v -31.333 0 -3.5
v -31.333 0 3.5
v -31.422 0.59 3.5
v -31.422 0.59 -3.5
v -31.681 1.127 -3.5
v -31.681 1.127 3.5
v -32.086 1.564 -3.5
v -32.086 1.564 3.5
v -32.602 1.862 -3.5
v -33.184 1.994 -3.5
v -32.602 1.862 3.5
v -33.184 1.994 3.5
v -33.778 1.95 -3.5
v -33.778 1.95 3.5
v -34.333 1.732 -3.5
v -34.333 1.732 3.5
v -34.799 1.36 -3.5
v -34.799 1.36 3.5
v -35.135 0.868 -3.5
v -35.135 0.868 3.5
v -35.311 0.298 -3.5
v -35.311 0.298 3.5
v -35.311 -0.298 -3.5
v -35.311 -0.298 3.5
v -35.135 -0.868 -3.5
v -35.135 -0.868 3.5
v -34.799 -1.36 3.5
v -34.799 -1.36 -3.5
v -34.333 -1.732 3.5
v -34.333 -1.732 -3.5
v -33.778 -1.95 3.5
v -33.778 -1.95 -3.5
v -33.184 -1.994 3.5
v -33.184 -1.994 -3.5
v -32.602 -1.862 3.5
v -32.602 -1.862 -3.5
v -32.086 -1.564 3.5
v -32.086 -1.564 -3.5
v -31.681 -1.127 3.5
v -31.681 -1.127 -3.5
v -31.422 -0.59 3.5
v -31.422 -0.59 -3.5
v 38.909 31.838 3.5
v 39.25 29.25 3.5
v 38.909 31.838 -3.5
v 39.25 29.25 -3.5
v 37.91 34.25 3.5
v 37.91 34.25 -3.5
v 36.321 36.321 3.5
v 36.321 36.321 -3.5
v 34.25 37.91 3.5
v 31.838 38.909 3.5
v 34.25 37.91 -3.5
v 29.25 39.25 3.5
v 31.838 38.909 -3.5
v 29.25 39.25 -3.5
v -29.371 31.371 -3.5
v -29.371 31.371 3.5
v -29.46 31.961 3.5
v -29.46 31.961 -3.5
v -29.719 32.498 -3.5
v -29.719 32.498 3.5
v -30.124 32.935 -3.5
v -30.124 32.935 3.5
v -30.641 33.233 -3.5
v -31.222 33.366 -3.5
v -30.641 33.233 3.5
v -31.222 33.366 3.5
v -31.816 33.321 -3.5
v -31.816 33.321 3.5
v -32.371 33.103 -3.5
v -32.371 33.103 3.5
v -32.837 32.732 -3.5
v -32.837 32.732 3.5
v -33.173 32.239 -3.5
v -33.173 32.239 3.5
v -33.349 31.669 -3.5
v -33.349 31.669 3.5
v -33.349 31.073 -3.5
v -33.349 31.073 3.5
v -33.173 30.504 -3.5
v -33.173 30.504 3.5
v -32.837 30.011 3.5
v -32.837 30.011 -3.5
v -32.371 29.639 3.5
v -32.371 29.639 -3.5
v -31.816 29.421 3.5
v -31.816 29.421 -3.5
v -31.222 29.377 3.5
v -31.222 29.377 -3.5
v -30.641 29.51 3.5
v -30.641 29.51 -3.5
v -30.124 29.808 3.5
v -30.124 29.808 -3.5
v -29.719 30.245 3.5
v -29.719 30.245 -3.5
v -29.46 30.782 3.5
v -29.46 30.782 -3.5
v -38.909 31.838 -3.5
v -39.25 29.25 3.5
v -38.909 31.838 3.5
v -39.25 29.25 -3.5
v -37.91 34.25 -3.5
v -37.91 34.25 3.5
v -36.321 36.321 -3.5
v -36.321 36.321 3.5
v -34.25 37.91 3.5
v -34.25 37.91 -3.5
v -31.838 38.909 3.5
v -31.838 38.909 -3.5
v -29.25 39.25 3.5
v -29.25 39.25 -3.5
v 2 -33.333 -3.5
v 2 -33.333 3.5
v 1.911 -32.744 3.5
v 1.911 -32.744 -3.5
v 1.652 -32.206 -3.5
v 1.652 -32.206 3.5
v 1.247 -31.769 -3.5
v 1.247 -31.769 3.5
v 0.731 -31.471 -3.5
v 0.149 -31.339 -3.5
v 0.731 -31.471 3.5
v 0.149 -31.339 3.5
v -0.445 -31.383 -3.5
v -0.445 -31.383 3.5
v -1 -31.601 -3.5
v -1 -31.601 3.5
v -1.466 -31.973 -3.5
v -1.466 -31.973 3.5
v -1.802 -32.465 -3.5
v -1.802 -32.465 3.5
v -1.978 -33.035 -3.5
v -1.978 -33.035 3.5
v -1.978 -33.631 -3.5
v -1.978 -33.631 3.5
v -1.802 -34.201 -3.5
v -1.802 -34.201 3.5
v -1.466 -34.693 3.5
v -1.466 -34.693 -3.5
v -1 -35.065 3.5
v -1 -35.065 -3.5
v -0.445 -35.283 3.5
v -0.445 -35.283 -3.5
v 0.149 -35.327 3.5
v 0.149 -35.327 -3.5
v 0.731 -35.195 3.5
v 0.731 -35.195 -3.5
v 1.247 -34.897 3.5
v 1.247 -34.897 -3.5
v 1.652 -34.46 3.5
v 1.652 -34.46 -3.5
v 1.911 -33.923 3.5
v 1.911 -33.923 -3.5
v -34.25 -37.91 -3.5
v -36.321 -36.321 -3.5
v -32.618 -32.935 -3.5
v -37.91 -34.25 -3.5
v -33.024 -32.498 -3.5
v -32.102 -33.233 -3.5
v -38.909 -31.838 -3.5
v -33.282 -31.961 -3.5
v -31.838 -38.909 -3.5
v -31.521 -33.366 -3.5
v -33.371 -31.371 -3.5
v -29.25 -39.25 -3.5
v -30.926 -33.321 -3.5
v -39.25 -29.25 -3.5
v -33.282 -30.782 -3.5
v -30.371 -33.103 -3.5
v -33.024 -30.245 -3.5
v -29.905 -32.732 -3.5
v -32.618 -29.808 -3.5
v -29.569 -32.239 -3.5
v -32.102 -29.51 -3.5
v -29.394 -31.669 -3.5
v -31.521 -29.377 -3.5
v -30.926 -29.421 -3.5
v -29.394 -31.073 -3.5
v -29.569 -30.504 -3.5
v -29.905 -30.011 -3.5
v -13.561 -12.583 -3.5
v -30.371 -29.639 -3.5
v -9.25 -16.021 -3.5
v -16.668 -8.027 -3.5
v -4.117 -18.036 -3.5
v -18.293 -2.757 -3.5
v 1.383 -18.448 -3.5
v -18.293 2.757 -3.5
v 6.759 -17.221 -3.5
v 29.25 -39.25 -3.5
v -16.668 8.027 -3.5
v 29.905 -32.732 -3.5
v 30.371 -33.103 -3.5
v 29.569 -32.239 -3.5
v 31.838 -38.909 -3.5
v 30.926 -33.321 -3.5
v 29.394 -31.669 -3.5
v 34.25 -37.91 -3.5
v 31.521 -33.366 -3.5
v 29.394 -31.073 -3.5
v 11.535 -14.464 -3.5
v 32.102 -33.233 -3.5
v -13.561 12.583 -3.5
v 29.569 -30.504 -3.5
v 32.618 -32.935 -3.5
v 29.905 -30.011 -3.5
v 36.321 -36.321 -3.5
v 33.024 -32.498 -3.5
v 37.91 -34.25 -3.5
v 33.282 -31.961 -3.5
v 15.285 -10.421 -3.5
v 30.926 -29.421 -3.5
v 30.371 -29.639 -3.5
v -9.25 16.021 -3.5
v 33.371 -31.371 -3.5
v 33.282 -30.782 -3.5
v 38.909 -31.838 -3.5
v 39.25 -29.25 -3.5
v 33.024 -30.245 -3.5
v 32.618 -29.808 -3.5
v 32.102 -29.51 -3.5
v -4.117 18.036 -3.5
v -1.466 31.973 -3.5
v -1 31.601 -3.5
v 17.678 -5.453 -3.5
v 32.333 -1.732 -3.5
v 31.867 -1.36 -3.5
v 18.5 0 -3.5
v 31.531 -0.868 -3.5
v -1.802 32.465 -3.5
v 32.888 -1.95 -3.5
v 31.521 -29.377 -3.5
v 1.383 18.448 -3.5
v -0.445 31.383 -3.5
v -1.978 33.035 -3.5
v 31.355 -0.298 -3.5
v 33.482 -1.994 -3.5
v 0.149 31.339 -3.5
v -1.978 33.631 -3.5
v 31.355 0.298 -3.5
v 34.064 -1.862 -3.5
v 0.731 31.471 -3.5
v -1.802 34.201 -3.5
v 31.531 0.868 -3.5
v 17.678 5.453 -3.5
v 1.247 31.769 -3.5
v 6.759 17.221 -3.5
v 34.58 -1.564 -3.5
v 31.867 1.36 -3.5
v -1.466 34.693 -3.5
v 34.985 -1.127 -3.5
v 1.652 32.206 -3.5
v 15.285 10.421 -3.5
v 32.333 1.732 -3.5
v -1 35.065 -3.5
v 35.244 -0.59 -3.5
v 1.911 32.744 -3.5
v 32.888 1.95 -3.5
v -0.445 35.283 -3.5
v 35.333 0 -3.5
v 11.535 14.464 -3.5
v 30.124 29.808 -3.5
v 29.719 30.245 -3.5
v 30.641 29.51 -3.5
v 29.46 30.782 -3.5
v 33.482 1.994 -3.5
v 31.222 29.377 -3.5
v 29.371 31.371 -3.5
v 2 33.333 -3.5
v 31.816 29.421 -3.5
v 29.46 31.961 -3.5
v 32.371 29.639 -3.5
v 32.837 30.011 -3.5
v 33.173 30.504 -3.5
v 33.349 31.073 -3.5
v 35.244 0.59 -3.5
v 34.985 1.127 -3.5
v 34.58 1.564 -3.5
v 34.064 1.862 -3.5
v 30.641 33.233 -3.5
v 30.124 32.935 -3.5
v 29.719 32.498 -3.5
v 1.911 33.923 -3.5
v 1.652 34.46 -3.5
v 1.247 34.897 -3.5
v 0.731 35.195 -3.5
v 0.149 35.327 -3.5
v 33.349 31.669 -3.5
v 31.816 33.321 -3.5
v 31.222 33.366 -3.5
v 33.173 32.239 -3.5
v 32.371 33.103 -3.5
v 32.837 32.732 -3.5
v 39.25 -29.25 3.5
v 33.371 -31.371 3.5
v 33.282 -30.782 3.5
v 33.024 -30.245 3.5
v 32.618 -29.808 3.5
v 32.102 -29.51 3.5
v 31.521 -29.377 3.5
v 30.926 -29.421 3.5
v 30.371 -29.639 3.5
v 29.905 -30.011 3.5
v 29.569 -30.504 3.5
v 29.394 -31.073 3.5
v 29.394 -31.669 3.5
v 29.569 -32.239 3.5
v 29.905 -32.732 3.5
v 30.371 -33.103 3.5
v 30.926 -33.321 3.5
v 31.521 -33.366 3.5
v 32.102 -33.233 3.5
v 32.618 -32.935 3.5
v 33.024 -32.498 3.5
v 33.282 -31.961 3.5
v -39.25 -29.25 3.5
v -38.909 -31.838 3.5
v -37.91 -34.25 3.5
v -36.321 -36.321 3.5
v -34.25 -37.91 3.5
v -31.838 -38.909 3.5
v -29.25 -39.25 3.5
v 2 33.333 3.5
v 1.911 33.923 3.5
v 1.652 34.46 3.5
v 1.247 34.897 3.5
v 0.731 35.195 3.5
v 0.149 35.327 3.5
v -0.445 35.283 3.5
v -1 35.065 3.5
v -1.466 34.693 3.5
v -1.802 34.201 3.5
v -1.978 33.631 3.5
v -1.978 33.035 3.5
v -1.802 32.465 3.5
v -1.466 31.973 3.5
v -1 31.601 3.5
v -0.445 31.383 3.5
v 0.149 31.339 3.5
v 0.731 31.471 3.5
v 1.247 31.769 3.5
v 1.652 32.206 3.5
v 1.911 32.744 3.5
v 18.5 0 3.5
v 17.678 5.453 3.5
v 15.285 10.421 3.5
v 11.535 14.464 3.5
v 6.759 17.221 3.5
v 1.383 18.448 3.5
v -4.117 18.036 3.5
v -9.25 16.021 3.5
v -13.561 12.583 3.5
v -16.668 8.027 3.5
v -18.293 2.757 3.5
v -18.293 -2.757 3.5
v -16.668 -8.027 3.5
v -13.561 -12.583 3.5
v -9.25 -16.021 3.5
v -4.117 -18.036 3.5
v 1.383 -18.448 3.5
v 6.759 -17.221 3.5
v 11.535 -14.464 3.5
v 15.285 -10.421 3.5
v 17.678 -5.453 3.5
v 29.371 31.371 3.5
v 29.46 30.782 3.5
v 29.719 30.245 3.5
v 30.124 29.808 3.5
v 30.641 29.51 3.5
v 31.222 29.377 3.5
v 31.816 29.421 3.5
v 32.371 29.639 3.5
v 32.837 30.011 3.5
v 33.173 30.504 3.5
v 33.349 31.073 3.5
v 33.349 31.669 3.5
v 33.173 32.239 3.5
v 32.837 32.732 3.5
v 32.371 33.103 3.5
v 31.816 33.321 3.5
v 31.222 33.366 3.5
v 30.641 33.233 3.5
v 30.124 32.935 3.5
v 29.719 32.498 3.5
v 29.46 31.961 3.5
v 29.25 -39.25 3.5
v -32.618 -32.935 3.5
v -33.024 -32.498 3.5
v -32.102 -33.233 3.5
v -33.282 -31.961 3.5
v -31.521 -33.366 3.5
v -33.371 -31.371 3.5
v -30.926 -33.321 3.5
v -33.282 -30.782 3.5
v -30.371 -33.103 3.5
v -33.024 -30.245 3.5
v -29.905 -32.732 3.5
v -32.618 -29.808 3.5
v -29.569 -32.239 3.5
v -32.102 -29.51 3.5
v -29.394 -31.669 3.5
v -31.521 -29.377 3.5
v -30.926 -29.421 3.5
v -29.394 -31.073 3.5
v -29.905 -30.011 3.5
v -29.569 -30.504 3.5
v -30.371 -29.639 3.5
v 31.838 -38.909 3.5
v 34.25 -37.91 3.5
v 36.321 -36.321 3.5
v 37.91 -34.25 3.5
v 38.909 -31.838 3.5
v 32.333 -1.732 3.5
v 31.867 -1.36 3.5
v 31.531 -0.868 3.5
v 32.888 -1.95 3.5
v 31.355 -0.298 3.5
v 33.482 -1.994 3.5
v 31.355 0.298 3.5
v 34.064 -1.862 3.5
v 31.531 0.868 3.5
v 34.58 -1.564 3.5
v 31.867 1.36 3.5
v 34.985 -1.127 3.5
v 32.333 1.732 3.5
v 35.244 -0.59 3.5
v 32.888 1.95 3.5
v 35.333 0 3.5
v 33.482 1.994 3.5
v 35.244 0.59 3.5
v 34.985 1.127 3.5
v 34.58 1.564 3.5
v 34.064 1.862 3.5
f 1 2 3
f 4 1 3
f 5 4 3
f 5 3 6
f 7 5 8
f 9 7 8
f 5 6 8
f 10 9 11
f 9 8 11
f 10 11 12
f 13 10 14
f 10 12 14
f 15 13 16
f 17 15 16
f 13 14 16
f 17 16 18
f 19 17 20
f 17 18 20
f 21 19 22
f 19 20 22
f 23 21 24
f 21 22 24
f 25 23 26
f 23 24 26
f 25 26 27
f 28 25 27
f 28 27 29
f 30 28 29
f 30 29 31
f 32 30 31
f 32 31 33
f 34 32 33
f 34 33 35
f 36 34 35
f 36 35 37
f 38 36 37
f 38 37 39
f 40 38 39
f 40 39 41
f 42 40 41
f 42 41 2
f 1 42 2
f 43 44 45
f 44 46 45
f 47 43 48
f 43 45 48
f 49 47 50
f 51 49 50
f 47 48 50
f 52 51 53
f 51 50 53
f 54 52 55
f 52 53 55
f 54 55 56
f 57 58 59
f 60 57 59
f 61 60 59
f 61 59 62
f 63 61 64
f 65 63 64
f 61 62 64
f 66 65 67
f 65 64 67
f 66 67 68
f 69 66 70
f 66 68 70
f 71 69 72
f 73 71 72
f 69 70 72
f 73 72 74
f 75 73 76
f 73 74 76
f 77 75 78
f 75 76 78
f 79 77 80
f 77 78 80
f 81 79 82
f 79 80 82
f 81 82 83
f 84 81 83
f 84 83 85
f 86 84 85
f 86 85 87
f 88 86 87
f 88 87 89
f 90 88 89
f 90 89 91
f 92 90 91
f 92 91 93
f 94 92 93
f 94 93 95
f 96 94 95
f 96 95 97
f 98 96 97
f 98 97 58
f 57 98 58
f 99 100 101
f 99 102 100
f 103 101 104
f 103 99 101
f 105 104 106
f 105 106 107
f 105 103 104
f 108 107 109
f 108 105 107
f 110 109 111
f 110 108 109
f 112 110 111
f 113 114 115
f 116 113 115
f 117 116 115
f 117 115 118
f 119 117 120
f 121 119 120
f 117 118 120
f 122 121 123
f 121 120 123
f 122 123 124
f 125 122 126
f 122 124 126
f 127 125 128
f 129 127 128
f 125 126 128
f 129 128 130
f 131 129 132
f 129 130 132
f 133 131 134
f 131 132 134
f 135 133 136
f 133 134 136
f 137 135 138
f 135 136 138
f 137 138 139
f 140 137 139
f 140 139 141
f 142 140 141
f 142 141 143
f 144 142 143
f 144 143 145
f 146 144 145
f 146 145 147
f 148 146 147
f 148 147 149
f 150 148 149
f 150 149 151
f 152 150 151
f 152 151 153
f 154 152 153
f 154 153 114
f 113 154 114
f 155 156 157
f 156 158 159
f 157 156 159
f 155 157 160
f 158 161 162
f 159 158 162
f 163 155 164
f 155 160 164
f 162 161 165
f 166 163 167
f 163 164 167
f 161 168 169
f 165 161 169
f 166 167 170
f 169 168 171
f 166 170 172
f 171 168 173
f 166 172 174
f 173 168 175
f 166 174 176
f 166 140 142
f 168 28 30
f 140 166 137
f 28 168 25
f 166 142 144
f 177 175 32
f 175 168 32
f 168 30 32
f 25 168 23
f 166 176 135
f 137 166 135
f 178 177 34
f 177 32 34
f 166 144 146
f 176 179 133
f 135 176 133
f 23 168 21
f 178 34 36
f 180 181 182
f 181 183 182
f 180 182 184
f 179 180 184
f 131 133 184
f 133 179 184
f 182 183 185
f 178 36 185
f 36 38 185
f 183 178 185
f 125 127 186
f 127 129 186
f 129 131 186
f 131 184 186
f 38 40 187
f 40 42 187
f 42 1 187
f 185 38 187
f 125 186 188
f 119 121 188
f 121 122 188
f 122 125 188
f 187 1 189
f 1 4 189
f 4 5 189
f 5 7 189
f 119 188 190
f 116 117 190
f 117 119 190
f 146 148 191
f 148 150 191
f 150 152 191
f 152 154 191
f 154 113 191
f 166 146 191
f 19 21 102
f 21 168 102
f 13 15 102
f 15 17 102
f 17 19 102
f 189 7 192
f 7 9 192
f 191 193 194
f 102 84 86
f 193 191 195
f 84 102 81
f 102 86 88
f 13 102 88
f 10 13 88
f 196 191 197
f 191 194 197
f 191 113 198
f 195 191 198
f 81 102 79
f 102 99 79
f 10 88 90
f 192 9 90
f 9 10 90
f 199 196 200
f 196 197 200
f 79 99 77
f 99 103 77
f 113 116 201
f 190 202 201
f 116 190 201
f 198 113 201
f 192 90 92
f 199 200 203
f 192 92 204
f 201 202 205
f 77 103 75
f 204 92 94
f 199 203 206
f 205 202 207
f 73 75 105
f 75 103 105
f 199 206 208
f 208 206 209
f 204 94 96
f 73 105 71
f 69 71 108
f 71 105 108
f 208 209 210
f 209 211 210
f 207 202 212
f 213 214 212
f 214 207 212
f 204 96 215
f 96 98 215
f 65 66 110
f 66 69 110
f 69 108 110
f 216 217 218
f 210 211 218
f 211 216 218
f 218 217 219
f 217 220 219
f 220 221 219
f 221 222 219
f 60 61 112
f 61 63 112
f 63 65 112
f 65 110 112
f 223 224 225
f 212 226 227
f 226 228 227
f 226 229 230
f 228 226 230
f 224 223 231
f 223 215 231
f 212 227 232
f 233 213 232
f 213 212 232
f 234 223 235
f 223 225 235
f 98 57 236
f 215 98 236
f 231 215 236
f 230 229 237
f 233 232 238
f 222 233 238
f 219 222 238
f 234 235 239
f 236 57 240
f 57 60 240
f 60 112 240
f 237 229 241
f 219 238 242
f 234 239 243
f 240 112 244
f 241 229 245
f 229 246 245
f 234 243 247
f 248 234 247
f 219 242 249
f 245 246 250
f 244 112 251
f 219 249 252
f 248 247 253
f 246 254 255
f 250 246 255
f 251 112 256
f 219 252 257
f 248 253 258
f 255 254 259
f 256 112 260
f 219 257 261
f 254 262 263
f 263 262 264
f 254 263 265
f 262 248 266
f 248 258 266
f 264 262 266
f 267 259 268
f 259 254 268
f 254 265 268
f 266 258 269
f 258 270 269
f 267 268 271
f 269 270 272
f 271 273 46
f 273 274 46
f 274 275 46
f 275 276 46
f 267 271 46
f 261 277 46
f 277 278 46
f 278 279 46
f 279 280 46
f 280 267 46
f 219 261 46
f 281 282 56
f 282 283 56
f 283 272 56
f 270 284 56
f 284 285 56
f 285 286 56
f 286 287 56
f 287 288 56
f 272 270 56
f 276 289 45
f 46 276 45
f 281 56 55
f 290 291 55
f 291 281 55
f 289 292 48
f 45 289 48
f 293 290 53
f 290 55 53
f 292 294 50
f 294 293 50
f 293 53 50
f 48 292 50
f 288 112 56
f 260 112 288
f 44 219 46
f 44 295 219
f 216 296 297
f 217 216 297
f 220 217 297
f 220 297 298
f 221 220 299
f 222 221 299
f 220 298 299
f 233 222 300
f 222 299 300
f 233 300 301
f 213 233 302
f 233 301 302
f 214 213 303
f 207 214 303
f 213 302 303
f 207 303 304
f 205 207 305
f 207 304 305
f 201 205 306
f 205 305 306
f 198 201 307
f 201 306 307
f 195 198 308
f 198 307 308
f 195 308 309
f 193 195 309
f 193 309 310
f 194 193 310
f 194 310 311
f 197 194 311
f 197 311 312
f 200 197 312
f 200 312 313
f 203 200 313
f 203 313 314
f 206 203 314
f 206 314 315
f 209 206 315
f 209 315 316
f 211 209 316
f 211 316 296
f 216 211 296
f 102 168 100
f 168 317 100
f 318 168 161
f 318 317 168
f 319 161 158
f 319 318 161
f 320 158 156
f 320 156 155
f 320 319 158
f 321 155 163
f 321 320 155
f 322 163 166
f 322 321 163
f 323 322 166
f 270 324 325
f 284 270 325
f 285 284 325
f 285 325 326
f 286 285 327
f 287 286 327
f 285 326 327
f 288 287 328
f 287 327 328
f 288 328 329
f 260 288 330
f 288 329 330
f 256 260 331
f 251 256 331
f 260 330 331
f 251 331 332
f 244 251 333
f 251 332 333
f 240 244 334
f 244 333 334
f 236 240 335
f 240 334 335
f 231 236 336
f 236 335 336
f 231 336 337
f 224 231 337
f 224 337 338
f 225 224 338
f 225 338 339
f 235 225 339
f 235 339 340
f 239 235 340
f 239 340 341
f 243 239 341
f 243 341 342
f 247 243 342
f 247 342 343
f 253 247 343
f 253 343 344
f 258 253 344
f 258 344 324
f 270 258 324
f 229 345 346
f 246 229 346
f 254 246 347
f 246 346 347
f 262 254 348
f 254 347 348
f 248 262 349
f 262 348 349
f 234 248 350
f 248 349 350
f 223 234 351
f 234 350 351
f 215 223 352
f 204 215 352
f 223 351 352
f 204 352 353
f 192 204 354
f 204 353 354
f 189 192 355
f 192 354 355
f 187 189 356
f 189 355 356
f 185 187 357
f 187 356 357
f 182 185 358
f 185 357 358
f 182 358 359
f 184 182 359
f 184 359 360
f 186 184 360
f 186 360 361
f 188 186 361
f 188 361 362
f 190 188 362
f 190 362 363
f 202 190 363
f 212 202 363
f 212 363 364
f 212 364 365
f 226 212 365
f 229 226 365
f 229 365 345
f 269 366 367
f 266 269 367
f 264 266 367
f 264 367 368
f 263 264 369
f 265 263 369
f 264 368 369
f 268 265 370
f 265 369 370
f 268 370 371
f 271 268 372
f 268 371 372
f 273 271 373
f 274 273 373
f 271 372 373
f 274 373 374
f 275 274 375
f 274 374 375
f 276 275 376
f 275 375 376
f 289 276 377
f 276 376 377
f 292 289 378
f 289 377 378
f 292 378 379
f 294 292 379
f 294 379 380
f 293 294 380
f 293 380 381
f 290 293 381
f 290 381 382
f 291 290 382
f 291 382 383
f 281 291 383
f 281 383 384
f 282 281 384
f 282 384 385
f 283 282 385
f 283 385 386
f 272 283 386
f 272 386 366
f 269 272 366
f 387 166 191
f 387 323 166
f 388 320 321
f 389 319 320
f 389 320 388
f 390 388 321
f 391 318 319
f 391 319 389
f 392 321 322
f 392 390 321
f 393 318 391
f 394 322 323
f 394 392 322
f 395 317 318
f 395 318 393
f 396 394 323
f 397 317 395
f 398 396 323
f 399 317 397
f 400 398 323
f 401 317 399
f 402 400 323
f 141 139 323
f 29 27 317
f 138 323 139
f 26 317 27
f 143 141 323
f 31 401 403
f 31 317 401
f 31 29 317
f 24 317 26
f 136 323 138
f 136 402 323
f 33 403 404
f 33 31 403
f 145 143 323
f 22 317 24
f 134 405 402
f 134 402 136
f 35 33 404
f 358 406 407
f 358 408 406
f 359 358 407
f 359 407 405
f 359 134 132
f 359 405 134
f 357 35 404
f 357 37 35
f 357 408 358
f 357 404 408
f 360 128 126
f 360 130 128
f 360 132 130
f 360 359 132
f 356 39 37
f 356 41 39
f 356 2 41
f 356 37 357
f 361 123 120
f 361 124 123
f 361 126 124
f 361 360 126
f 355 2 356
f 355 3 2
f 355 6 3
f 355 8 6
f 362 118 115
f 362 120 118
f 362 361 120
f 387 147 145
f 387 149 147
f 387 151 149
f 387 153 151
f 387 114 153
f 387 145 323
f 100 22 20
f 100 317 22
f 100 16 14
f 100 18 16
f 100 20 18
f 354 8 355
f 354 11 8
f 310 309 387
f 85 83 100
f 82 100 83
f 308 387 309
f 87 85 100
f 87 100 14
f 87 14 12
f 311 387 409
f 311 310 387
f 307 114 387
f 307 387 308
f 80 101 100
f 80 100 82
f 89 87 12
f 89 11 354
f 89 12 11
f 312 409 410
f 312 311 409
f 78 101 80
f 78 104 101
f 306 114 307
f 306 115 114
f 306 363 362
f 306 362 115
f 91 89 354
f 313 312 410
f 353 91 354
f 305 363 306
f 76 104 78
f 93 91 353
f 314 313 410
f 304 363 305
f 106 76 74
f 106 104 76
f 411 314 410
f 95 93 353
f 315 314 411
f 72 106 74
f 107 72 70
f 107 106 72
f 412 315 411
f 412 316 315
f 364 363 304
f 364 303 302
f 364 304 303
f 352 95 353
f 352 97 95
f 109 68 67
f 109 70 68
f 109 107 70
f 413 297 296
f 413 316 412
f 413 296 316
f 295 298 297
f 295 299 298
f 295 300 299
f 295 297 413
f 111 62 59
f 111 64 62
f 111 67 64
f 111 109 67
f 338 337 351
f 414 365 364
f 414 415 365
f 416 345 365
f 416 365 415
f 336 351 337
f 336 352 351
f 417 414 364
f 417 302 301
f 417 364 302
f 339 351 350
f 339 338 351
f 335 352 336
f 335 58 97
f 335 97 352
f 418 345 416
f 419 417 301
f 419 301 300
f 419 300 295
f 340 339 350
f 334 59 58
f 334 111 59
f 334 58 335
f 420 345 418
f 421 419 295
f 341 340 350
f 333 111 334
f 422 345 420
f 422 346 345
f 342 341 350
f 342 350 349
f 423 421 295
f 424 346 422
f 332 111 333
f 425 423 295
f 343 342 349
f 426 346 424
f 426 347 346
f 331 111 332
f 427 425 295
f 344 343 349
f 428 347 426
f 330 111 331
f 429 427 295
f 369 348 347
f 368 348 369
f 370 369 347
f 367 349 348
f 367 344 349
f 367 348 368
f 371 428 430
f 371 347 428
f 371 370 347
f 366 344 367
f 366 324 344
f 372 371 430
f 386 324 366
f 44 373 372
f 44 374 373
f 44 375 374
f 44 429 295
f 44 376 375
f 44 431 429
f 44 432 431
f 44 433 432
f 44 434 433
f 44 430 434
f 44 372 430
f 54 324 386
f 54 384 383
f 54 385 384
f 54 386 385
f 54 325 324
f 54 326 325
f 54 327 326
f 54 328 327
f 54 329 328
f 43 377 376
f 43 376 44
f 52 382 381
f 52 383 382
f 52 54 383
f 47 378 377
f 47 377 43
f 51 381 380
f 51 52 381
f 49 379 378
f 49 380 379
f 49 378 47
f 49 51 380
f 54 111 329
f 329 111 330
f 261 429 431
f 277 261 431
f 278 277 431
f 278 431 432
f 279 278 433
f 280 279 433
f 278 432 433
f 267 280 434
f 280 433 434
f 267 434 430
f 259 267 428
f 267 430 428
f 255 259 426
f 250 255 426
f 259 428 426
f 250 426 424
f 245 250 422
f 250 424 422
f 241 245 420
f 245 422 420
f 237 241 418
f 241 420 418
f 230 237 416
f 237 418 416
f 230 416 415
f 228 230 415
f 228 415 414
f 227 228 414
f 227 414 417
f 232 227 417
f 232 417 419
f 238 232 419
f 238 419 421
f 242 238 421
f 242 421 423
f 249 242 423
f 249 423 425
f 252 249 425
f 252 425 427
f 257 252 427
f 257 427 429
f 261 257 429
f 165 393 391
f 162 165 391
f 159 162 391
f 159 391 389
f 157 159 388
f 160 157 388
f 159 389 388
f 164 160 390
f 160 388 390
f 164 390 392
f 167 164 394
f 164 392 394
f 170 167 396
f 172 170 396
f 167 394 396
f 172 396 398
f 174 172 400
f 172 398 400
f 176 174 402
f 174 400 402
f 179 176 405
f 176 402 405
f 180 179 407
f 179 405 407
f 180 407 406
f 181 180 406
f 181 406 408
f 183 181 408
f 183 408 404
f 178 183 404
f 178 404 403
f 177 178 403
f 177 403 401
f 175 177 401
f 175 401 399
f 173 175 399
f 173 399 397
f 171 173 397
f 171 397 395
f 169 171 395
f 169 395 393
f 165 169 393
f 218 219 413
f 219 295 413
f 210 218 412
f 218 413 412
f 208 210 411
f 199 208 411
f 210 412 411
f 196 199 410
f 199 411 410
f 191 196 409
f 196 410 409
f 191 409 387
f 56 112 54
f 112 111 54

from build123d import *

# Parameters (mm, degrees)
SKETCH1_W           = 78.5
SKETCH1_H           = 78.5
BOSS_EXTRUDE1_DEPTH = 3.5
FILLET1_R           = 10
SKETCH2_R           = 2
CUT_EXTRUDE1_DEPTH  = 56.947520052
SKETCH3_R           = 18.5
CUT_EXTRUDE2_DEPTH  = 56.947520052
SKETCH4_R           = 2
CUT_EXTRUDE3_DEPTH  = 56.947520052


with BuildPart() as part:
    # Sketch1 → Boss-Extrude1 (new, symmetric)
    with BuildSketch(Plane.XY):
        Rectangle(SKETCH1_W, SKETCH1_H)
    extrude(amount=BOSS_EXTRUDE1_DEPTH, both=True)

    # Fillet1
    fillet1_edges = [part.edges().sort_by_distance(p)[0] for p in [
        (39.25, -39.25, 0),
        (-39.25, -39.25, 0),
        (-39.25, 39.25, 0),
        (39.25, 39.25, 0),
    ]]
    fillet(fillet1_edges, radius=FILLET1_R)

    # Sketch2 → Cut-Extrude1 (cut, through all)
    with BuildSketch(Plane.XY.offset(3.5)):
        with Locations((-31.371320344, 31.371320344)):
            Circle(SKETCH2_R)
        with Locations(Location((-31.371320344, -31.371320344, 0), (0, 0, 180))):
            Circle(SKETCH2_R)
        with Locations(Location((31.371320344, 31.371320344, 0), (0, 0, 180))):
            Circle(SKETCH2_R)
        with Locations((31.371320344, -31.371320344)):
            Circle(SKETCH2_R)
    extrude(amount=-CUT_EXTRUDE1_DEPTH, mode=Mode.SUBTRACT)

    # Sketch3 → Cut-Extrude2 (cut, through all)
    with BuildSketch(Plane.XY.offset(3.5)):
        Circle(SKETCH3_R)
    extrude(amount=-CUT_EXTRUDE2_DEPTH, mode=Mode.SUBTRACT)

    # Sketch4 → Cut-Extrude3 (cut, through all)
    with BuildSketch(Plane.XY.offset(3.5)):
        with Locations((0, 33.333013665)):
            Circle(SKETCH4_R)
        with Locations((-33.333013665, 0)):
            Circle(SKETCH4_R)
        with Locations((0, -33.333013665)):
            Circle(SKETCH4_R)
        with Locations((33.333013665, 0)):
            Circle(SKETCH4_R)
    extrude(amount=-CUT_EXTRUDE3_DEPTH, mode=Mode.SUBTRACT)


solid = part.part
